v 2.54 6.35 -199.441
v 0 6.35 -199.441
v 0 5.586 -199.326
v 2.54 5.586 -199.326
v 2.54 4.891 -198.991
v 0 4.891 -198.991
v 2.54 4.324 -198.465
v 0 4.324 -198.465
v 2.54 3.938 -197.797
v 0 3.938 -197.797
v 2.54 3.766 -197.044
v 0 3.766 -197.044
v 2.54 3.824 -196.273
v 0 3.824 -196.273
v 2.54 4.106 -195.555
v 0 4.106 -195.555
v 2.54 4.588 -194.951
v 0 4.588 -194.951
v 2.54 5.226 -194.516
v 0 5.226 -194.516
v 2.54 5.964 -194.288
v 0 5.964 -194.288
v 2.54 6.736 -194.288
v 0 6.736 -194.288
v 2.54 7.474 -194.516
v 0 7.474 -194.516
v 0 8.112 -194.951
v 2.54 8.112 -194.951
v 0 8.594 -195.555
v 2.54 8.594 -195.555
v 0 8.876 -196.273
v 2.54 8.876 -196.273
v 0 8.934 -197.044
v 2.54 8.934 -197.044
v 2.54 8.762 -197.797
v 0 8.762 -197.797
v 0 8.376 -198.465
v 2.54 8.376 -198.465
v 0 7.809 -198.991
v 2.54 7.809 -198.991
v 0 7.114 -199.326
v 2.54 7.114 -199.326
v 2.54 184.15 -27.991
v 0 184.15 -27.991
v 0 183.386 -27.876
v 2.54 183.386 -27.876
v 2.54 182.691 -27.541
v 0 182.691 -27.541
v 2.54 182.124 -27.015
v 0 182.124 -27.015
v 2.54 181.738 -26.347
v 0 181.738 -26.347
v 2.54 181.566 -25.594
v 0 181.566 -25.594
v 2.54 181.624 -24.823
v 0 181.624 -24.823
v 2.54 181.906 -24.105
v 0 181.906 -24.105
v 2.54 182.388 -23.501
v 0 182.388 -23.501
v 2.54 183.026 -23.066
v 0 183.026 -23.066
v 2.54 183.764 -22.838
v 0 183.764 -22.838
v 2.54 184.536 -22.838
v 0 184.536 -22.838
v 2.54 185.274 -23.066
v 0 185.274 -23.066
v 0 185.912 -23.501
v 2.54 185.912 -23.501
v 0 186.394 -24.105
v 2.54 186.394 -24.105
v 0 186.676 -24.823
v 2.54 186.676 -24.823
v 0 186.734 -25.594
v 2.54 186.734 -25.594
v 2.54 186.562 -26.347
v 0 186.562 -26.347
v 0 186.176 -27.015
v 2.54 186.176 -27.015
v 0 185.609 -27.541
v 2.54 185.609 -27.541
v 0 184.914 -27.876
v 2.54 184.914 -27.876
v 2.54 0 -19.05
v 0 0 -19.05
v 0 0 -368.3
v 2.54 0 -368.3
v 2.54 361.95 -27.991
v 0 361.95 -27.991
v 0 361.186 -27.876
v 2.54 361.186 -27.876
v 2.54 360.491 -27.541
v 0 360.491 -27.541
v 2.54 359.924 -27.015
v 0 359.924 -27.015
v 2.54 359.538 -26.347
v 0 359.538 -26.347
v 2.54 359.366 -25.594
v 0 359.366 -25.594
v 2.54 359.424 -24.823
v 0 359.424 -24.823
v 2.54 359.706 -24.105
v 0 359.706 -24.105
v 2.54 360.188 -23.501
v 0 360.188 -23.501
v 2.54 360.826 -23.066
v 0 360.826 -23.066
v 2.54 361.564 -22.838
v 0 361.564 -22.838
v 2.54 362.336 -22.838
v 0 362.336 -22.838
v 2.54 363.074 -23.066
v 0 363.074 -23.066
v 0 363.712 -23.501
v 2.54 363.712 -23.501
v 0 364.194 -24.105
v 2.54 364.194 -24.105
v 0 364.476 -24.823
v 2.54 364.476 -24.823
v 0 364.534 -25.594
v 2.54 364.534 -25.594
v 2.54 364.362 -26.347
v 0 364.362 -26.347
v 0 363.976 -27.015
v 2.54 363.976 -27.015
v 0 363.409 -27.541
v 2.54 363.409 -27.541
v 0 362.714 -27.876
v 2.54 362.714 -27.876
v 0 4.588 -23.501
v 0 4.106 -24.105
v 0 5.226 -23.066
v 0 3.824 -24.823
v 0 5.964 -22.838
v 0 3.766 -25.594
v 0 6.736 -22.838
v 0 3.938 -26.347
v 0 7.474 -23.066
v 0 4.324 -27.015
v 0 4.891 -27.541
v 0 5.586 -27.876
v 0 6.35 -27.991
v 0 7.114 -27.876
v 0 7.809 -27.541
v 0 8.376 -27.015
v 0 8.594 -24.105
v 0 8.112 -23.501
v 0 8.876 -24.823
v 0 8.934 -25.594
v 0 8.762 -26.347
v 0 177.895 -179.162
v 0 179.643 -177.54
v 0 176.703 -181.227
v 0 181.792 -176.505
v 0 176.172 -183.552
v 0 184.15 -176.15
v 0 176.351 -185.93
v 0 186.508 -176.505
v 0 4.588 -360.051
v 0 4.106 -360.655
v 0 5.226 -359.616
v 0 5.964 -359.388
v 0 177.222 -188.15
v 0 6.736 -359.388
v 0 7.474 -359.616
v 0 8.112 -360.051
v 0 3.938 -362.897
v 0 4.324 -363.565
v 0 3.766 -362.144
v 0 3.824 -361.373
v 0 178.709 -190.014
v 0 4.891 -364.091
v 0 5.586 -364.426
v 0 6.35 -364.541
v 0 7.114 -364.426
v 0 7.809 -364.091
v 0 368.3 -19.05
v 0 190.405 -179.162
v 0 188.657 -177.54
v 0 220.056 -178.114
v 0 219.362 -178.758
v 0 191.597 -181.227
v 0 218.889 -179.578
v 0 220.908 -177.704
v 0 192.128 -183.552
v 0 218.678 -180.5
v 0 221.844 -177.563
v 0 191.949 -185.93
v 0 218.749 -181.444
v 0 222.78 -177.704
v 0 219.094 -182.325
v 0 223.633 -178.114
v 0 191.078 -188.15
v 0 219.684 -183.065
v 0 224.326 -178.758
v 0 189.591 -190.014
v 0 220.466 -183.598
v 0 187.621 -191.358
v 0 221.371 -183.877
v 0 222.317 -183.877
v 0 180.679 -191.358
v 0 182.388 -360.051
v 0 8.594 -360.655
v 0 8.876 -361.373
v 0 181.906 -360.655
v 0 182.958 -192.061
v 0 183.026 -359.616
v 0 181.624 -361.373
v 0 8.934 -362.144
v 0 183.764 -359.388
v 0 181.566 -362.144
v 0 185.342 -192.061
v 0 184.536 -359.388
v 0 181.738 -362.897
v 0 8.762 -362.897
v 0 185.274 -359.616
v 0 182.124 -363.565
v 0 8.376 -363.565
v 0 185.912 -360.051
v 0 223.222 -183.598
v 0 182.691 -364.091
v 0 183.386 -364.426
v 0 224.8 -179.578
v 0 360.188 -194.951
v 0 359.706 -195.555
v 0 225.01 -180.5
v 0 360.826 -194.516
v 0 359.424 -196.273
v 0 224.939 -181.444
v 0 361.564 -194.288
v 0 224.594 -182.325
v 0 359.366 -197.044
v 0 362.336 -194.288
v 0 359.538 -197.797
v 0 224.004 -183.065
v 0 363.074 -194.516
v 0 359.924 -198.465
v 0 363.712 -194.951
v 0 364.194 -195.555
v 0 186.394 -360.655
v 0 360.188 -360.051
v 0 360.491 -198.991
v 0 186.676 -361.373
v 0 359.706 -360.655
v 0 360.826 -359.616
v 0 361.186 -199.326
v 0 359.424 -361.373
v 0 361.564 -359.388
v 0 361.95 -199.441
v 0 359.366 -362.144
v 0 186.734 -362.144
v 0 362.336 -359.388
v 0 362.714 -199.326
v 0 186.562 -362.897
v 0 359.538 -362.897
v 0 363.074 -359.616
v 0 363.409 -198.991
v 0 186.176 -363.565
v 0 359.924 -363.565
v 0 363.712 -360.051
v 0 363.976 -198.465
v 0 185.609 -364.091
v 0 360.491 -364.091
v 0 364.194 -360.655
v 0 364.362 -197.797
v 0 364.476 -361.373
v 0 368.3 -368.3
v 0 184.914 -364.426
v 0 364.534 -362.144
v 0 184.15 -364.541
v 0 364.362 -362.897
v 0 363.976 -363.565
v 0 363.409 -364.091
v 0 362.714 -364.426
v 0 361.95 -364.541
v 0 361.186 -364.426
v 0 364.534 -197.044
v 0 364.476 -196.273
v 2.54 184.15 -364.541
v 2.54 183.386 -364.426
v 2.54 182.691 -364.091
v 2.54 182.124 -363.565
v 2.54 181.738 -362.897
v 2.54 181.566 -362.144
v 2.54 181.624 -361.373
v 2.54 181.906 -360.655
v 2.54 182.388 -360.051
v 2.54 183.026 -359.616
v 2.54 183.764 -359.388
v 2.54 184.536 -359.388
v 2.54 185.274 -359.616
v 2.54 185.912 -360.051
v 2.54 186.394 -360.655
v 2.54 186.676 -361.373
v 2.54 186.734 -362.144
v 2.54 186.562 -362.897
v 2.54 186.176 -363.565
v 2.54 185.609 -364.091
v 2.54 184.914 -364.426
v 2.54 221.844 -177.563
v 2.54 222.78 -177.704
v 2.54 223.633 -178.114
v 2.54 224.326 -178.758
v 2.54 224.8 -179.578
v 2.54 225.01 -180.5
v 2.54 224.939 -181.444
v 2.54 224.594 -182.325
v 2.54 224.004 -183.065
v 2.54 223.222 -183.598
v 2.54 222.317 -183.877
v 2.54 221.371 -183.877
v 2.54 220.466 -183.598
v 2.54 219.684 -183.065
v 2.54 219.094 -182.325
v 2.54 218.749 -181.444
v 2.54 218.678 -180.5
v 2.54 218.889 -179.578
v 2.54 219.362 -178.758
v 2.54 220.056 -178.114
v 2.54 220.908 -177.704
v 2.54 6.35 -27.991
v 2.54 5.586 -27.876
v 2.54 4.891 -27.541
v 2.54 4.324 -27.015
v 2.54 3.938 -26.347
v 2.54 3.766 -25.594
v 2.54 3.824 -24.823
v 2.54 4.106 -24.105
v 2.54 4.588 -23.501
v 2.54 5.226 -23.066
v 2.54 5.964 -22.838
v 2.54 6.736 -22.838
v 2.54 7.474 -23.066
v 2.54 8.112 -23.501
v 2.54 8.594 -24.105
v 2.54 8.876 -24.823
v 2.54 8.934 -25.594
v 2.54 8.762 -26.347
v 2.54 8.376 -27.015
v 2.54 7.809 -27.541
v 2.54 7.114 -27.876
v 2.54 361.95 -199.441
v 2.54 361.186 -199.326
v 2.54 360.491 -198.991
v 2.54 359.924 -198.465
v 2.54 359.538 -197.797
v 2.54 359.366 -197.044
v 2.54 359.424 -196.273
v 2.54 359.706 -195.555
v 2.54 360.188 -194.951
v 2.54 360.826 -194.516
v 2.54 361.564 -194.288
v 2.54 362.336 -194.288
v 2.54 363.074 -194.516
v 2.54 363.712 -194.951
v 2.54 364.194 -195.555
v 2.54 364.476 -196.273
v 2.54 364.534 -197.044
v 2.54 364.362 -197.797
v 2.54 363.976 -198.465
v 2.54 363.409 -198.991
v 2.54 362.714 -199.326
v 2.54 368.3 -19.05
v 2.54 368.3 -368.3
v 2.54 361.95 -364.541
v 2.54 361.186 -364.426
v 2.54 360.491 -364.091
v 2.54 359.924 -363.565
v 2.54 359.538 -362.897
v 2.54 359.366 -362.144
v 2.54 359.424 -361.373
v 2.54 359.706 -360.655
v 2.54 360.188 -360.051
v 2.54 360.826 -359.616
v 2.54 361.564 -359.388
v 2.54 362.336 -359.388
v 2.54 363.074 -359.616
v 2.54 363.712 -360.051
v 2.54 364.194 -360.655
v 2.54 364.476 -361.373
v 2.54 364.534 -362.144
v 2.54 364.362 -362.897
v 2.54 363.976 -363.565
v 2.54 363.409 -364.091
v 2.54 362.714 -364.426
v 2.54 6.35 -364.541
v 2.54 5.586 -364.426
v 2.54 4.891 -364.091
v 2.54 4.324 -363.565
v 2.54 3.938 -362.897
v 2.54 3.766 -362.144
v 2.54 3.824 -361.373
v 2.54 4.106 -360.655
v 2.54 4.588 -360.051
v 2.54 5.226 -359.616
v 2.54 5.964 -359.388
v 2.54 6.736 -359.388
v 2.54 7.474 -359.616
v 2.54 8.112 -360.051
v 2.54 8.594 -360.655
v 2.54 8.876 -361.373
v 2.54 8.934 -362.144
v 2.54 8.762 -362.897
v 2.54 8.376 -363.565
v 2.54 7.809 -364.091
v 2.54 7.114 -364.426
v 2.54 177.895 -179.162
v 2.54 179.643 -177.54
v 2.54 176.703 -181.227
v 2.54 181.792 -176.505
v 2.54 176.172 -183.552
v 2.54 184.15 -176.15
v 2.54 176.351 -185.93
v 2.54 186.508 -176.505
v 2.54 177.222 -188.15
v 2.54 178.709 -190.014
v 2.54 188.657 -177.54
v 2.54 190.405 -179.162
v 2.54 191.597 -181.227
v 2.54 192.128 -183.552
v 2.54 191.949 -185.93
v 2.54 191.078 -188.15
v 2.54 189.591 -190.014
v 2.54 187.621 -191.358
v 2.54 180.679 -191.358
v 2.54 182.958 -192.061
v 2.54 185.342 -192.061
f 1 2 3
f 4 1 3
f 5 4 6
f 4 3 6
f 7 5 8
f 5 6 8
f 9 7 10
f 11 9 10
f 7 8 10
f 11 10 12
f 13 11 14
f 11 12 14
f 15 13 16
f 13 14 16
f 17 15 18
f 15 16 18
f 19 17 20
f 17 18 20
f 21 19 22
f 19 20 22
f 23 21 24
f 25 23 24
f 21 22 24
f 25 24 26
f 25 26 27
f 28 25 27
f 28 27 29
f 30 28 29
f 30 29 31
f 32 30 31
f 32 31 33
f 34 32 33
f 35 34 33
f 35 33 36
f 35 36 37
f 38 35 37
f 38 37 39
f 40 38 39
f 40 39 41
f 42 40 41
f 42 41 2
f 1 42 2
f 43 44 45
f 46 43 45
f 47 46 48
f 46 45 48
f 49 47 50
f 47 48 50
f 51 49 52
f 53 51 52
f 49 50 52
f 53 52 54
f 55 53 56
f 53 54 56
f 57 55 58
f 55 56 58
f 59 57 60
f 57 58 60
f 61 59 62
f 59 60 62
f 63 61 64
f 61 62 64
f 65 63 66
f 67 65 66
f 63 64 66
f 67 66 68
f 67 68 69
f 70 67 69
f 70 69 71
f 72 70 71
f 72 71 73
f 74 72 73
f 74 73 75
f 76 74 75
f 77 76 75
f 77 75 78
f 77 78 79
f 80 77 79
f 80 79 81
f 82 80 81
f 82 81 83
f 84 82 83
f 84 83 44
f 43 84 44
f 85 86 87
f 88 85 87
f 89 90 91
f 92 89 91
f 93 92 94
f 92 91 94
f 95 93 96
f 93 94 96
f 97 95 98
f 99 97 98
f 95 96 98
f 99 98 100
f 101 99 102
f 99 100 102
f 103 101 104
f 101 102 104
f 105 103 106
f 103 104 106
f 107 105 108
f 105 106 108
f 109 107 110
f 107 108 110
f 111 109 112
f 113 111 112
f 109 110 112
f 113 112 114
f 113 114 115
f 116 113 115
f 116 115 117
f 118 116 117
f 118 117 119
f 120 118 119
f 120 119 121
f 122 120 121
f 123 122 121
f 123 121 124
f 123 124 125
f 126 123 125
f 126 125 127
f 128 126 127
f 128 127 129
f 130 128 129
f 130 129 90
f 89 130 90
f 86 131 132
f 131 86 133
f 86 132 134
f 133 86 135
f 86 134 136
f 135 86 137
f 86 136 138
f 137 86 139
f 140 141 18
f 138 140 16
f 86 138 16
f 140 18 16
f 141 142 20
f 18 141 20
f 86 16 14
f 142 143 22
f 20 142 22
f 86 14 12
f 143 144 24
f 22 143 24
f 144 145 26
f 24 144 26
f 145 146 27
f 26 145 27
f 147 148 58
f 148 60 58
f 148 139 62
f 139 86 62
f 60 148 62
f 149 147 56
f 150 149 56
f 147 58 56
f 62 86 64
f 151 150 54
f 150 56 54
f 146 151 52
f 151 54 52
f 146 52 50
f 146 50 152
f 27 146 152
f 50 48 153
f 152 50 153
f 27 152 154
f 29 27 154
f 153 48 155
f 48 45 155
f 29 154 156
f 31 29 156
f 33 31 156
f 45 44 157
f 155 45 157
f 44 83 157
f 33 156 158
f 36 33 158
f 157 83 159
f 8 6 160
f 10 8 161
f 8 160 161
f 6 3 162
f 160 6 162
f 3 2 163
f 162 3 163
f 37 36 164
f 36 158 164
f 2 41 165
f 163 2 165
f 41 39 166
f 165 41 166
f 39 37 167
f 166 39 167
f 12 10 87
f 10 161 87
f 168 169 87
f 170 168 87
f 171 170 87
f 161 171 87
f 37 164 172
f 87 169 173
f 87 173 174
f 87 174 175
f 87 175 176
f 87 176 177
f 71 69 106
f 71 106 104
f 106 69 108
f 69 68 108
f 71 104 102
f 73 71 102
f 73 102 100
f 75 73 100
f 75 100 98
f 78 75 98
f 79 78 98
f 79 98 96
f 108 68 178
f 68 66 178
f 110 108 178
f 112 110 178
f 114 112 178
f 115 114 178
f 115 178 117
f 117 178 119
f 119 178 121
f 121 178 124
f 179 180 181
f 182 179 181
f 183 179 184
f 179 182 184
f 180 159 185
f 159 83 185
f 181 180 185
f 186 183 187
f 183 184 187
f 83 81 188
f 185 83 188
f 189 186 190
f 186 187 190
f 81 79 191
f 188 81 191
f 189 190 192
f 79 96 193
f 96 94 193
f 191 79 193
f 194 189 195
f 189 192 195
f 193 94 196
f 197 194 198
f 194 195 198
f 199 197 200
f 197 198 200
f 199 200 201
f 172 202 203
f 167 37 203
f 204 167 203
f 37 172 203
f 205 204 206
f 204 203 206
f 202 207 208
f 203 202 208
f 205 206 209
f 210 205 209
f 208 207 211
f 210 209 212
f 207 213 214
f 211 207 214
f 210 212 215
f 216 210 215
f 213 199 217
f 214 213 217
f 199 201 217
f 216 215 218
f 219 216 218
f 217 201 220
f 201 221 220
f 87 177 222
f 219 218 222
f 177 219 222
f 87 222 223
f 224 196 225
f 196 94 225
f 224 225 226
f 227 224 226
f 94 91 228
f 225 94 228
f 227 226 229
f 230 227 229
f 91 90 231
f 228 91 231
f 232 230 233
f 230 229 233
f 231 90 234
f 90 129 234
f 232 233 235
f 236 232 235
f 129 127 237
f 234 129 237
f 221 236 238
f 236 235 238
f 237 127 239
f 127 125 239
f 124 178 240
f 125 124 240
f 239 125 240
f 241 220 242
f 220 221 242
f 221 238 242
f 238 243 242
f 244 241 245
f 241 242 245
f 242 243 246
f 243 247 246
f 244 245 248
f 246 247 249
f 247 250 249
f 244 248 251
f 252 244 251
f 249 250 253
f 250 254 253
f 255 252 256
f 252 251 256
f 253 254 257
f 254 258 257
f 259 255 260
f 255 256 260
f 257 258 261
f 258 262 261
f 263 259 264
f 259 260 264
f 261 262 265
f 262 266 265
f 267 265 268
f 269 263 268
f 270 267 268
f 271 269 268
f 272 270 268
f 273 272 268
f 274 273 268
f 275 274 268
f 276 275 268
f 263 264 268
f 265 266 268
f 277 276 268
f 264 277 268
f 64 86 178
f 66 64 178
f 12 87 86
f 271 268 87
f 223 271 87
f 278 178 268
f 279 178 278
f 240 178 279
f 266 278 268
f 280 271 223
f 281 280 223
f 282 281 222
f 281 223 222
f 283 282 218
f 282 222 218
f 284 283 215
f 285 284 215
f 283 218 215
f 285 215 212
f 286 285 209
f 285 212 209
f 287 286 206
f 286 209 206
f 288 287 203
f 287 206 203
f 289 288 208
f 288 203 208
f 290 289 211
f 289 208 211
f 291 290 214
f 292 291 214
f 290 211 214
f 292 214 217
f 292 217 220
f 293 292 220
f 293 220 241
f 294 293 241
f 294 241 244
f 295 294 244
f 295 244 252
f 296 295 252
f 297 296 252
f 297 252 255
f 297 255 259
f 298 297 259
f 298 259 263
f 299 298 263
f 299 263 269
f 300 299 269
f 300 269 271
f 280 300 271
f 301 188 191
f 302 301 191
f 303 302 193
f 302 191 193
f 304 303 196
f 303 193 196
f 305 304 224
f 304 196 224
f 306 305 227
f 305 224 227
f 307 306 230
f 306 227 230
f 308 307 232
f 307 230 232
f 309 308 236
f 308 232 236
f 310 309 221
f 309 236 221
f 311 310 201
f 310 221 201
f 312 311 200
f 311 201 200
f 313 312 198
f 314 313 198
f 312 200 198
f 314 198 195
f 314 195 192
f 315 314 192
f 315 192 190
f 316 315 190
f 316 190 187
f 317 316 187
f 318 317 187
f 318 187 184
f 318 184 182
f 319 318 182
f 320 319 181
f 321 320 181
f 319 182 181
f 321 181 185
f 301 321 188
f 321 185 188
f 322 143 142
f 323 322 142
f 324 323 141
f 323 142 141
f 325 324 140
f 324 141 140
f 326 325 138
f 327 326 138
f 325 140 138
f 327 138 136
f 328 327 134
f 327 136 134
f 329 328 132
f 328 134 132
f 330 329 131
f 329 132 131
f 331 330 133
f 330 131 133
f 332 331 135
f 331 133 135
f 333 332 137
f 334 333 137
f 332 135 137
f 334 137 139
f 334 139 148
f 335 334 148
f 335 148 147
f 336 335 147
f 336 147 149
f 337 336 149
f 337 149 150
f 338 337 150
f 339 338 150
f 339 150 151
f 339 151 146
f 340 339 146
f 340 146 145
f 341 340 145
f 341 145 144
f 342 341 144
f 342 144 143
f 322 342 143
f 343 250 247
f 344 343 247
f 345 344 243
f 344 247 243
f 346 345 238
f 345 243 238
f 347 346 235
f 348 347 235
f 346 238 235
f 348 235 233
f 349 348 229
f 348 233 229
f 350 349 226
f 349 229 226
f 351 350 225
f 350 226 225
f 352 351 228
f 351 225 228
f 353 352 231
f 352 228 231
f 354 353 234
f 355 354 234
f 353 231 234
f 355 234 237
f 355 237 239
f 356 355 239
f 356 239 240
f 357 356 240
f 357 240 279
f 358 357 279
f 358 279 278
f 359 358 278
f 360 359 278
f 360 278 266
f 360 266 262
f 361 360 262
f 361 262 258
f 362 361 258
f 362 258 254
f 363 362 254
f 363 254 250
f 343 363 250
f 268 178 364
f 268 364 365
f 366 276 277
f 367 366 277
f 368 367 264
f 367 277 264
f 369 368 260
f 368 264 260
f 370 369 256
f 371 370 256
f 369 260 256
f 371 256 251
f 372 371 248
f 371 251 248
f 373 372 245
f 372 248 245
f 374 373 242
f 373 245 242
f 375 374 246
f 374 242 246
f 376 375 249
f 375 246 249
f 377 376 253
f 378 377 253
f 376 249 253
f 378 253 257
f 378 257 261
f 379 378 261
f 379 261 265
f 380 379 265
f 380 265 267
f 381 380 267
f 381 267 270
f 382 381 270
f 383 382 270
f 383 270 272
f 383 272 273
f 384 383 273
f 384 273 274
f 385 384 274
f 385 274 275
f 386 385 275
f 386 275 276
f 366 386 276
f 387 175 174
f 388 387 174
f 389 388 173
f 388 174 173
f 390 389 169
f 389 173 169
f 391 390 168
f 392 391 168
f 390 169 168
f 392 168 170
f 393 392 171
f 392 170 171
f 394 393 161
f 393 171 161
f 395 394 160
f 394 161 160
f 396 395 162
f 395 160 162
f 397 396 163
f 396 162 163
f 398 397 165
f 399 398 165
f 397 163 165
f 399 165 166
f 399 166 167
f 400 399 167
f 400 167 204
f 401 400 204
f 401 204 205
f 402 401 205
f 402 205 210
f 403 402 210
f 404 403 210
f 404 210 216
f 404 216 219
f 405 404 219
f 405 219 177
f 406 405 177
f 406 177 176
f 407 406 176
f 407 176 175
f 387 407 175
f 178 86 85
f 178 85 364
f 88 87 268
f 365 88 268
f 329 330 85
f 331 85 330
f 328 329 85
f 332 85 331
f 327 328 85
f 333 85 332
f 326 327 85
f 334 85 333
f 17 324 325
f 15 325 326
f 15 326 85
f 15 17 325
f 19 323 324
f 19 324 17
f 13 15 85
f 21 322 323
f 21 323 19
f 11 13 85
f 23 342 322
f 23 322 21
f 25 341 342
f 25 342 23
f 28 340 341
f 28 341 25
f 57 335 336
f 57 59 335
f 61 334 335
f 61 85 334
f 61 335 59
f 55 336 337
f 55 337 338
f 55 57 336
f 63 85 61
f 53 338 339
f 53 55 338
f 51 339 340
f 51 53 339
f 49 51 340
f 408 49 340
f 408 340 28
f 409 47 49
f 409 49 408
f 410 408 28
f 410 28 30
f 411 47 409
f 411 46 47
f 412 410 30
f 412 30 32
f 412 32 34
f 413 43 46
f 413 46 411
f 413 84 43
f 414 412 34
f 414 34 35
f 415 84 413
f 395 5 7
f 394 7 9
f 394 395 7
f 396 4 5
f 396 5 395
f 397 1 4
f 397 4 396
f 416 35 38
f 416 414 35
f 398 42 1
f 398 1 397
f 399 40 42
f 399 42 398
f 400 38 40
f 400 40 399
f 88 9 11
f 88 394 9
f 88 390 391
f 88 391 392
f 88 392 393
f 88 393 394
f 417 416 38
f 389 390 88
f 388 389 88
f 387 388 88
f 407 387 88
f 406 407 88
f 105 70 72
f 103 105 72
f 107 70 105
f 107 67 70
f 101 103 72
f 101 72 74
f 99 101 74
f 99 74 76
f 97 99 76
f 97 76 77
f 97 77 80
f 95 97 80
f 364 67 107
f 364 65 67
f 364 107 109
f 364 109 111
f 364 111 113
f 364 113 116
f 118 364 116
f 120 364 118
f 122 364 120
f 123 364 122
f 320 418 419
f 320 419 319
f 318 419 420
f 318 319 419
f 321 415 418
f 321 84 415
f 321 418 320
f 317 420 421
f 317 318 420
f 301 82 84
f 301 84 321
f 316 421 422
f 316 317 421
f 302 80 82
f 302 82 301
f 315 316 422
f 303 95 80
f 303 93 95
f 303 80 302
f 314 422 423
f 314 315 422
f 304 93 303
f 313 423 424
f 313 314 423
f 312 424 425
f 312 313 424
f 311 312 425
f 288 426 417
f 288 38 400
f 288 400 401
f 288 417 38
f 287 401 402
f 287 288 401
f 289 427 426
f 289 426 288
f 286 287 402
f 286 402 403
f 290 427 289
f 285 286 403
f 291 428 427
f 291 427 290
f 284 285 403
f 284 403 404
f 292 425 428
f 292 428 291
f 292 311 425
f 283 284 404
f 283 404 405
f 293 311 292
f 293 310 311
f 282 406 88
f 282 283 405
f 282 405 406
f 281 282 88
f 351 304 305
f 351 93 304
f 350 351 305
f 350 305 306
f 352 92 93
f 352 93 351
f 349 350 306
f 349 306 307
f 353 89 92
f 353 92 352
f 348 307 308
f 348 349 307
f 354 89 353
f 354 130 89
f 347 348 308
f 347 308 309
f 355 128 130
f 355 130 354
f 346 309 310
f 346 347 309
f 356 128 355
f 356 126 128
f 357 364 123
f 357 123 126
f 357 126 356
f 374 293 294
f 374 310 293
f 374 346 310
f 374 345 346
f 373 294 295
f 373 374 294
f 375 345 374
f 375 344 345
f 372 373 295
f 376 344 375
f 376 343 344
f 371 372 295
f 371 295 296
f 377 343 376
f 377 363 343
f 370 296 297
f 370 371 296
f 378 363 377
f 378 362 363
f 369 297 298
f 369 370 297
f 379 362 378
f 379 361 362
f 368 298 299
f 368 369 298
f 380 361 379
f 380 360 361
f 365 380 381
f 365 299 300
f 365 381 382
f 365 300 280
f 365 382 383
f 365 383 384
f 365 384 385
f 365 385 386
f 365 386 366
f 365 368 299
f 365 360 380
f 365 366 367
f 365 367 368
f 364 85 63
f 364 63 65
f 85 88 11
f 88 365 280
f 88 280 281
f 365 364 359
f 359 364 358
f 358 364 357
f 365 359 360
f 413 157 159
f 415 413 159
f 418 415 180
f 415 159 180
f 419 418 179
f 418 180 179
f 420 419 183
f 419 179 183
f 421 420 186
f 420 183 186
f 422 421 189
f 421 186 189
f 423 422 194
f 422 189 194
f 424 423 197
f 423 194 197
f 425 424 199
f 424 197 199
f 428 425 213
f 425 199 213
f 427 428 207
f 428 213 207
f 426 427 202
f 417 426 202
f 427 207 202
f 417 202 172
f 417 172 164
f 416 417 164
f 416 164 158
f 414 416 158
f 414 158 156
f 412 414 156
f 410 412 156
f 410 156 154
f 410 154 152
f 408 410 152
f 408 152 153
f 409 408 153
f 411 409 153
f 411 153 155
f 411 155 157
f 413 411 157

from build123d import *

# Parameters (mm, degrees)
SKETCH1_W                  = 368.3
SKETCH1_H                  = 368.3
BOSS_EXTRUDE1_DEPTH        = 2.54
F_6_0_204_DIAMETER_HOLE1_D = 5.1816
SKETCH3_W                  = 19.05
SKETCH3_H                  = 368.3
CUT_EXTRUDE1_DEPTH         = 2.54
SKETCH4_R                  = 8
CUT_EXTRUDE2_DEPTH         = 3.54
SKETCH5_R                  = 3.175
CUT_EXTRUDE3_DEPTH         = 2.54


with BuildPart() as part:
    # Sketch1 → Boss-Extrude1 (new body)
    with BuildSketch(Plane(origin=(0, 0, 0), x_dir=(0, 0, -1), z_dir=(1, 0, 0))):
        with Locations((184.15, 184.15)):
            Rectangle(SKETCH1_W, SKETCH1_H)
    extrude(amount=BOSS_EXTRUDE1_DEPTH)

    # #6 (0.204) Diameter Hole1 (through all)
    with Locations(Plane(origin=(2.54, 361.95, -361.95), x_dir=(0, 0, 1), z_dir=(1, 0, 0))):
        with Locations((0, 0), (0, 355.6), (336.55, 355.6), (336.55, 0), (336.55, 177.8), (0, 177.8), (165.1, 355.6), (165.1, 0)):
            Hole(F_6_0_204_DIAMETER_HOLE1_D / 2)

    # Sketch3 → Cut-Extrude1 (cut)
    with BuildSketch(Plane.ZY):
        with Locations((-9.525, 184.15)):
            Rectangle(SKETCH3_W, SKETCH3_H)
    extrude(amount=-CUT_EXTRUDE1_DEPTH, mode=Mode.SUBTRACT)

    # Sketch4 → Cut-Extrude2 (cut, through all)
    with BuildSketch(Plane.ZY):
        with Locations((-184.15, 184.15)):
            Circle(SKETCH4_R)
    extrude(amount=-CUT_EXTRUDE2_DEPTH, mode=Mode.SUBTRACT)

    # Sketch5 → Cut-Extrude3 (cut)
    with BuildSketch(Plane.ZY):
        with Locations((-180.737580342, 221.844041513)):
            Circle(SKETCH5_R)
    extrude(amount=-CUT_EXTRUDE3_DEPTH, mode=Mode.SUBTRACT)


solid = part.part
